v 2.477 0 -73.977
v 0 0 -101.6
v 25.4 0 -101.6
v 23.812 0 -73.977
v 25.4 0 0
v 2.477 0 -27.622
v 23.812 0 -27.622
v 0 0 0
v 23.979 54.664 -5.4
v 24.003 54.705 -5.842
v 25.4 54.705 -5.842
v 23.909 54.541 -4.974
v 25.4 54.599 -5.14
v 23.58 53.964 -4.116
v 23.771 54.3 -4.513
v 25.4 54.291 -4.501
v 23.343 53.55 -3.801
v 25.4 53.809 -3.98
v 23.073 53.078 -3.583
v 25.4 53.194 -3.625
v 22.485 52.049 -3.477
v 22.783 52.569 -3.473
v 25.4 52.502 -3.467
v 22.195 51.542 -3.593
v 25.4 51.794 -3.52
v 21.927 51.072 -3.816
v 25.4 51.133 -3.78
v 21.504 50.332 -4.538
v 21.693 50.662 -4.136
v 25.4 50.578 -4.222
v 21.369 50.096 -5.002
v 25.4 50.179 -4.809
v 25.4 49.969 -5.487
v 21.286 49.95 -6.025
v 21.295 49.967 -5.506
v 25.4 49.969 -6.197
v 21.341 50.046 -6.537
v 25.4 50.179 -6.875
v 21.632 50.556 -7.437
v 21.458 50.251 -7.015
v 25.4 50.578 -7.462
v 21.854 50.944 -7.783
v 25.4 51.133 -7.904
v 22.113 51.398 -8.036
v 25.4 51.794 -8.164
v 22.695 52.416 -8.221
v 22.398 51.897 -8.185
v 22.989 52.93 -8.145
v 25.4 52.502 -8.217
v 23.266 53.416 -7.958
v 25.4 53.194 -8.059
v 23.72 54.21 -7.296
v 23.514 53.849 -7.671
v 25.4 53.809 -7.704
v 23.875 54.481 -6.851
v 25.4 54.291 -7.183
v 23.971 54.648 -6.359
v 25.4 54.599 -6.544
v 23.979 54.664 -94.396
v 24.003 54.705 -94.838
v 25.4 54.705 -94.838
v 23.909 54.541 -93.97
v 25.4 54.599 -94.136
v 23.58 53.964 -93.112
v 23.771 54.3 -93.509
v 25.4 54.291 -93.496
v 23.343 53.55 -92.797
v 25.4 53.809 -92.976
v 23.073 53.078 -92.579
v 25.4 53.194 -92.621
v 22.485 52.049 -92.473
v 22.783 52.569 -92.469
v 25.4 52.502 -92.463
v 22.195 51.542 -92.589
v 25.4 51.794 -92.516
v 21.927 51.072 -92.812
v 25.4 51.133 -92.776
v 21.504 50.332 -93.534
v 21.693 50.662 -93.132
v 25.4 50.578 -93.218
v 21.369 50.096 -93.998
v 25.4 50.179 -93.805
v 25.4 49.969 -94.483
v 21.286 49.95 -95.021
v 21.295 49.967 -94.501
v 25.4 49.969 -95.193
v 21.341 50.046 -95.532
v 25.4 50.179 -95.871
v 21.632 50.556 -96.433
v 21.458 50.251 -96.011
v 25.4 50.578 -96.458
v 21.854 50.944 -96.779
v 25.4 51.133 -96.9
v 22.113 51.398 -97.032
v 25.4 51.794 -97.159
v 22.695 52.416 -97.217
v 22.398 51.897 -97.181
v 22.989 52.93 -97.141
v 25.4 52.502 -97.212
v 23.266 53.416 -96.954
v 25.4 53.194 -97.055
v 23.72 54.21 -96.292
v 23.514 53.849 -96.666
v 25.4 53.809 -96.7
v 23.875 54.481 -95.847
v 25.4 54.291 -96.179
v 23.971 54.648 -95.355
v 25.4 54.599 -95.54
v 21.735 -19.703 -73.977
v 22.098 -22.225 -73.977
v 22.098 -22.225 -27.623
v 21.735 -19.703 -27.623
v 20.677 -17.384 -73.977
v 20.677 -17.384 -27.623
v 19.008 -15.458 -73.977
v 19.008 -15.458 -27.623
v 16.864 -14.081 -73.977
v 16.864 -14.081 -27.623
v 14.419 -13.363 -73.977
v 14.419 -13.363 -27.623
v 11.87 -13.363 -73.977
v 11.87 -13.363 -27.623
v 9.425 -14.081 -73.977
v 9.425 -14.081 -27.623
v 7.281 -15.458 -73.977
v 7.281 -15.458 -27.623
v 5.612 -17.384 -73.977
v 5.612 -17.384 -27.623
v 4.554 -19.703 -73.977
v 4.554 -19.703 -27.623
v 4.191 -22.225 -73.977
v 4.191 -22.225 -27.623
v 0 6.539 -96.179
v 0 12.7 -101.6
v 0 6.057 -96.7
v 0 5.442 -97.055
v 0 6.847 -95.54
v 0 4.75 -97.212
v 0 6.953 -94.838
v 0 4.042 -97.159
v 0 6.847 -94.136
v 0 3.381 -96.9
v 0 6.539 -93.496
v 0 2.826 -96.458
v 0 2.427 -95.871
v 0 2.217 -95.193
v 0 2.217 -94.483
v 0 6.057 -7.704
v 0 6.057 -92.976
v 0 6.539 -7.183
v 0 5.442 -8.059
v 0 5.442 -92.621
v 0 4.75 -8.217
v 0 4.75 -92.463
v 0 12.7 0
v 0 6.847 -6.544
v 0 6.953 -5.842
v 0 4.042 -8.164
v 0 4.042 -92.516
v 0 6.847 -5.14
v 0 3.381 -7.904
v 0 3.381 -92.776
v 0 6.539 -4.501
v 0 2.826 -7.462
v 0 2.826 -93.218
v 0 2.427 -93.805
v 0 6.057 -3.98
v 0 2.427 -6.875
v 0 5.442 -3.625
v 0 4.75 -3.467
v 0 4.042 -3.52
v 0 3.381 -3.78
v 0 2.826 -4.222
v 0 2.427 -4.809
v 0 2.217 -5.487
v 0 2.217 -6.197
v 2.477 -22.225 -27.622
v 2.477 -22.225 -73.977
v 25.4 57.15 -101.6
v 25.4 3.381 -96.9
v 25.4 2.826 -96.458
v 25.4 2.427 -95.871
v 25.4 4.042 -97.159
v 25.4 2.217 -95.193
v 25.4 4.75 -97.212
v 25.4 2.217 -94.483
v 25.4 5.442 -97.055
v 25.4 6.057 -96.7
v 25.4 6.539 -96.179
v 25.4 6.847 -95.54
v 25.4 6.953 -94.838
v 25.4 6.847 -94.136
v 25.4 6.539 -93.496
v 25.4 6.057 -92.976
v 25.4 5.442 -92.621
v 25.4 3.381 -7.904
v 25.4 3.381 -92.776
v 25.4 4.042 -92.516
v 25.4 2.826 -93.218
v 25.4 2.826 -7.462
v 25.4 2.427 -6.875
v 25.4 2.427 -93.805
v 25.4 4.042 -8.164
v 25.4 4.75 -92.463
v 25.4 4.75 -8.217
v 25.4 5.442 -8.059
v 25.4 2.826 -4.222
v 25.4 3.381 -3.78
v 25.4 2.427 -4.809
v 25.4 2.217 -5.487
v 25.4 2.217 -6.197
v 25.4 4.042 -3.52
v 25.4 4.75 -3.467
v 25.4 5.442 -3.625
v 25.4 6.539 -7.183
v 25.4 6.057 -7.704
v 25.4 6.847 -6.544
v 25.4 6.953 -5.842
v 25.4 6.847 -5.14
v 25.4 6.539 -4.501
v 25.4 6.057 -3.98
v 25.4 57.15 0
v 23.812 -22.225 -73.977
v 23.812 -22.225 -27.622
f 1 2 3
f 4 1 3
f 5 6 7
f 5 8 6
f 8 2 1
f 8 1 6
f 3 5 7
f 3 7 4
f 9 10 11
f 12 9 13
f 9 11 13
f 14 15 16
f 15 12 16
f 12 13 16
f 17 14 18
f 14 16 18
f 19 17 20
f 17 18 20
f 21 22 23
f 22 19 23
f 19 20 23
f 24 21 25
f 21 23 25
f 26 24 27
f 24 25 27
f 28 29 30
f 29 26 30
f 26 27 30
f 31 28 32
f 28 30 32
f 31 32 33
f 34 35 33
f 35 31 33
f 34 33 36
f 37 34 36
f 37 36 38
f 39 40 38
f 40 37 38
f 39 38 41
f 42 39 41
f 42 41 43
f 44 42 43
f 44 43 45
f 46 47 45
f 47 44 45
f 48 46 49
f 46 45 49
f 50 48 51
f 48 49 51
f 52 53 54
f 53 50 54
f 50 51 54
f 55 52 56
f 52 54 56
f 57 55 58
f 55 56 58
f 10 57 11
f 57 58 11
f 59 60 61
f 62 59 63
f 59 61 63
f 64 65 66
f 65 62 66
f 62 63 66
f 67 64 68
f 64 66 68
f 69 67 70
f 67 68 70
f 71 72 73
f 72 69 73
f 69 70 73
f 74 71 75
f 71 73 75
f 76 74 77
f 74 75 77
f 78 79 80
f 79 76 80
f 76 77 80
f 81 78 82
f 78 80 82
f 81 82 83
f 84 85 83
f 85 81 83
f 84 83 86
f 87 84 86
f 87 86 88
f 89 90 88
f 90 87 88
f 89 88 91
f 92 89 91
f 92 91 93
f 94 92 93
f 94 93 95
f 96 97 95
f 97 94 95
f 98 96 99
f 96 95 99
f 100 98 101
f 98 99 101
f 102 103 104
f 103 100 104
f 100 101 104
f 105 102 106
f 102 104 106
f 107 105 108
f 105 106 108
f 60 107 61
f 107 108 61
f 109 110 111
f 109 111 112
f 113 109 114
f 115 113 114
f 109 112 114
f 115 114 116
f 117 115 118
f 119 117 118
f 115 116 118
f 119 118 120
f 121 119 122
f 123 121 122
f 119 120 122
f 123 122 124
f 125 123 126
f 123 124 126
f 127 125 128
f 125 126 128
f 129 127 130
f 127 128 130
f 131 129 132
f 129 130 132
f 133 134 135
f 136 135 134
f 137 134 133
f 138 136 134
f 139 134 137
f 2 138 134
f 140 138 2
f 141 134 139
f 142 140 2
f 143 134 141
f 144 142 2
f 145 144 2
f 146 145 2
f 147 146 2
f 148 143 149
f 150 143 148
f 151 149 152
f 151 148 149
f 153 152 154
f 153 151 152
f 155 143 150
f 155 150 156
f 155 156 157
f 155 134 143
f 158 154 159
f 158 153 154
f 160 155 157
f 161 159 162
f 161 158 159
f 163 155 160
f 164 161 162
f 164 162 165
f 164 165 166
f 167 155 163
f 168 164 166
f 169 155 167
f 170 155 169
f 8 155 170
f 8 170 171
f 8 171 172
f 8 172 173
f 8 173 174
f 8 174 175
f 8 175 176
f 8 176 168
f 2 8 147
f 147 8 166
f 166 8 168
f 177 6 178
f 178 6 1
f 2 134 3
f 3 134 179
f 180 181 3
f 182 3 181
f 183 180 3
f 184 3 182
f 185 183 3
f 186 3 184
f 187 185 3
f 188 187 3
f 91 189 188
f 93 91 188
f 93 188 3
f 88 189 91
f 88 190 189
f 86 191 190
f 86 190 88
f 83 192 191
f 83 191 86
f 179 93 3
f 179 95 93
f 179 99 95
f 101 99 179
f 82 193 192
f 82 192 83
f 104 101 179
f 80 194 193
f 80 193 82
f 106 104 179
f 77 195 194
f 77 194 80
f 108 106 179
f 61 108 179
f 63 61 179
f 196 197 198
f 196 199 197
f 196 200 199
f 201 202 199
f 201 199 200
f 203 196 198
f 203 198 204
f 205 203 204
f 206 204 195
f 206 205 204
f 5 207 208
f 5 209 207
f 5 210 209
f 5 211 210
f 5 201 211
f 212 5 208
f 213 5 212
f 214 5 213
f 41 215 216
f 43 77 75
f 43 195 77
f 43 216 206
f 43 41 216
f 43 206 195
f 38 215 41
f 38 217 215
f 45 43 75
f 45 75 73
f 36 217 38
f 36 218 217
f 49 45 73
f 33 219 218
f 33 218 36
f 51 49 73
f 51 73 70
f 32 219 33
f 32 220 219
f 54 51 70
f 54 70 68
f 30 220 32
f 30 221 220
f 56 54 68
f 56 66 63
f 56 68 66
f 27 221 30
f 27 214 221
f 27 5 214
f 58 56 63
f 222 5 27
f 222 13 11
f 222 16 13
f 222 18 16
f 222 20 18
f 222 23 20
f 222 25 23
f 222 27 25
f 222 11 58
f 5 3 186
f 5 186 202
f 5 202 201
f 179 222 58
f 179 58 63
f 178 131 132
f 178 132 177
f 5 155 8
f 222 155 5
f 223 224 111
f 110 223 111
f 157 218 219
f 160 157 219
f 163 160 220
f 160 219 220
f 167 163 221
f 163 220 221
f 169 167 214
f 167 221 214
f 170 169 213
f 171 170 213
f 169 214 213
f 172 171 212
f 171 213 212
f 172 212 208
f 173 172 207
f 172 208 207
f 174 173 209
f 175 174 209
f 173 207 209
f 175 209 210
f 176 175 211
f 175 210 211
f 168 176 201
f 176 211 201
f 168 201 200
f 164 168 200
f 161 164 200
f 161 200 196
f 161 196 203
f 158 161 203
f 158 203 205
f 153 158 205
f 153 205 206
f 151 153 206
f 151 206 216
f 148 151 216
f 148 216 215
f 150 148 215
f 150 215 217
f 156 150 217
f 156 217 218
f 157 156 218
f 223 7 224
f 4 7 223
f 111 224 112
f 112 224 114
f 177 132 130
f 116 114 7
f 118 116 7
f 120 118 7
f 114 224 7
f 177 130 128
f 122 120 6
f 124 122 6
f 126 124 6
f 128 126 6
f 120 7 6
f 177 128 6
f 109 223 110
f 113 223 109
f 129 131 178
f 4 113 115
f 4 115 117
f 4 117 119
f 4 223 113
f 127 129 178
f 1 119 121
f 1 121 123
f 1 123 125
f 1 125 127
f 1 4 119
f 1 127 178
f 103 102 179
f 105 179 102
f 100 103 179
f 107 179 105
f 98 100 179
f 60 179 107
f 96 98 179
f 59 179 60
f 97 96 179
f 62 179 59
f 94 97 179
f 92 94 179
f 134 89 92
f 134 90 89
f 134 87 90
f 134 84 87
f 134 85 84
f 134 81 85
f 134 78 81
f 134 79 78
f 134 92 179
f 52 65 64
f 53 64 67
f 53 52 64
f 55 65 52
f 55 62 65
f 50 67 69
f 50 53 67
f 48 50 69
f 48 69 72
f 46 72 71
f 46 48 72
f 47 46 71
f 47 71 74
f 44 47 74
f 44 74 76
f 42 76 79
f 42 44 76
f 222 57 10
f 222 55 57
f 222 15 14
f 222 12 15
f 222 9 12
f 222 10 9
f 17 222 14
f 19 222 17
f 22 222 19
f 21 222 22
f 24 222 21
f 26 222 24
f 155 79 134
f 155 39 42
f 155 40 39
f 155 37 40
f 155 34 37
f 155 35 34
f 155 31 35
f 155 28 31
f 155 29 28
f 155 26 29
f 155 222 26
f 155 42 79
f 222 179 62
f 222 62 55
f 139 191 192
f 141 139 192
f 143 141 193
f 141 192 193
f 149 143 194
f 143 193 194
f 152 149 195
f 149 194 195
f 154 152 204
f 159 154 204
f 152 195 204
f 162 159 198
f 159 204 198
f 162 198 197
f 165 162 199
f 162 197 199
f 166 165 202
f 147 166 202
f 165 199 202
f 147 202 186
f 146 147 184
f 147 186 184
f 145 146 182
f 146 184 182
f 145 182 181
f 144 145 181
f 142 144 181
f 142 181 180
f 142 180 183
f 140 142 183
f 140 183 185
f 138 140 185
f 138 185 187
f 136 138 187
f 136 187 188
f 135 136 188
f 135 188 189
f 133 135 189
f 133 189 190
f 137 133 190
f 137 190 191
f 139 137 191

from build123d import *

# Parameters (mm, degrees)
BOSS_EXTRUDE1_DEPTH     = 101.6
SKETCH4_W               = 21.336
SKETCH4_H               = 46.355
BOSS_EXTRUDE2_DEPTH     = 22.225
CUT_EXTRUDE5_DEPTH      = 97.870805748
CUT_EXTRUDE5_DEPTH_BACK = 97.870805748
SKETCH8_R               = 2.38125
CUT_EXTRUDE6_DEPTH      = 120.305668348


with BuildPart() as part:
    # Sketch1 → Boss-Extrude1 (new body)
    with BuildSketch(Plane.XY):
        Polygon((0, 0), (25.4, 0), (25.4, 57.15), (0, 12.7), align=None)
    extrude(amount=-BOSS_EXTRUDE1_DEPTH)

    # Sketch4 → Boss-Extrude2 (add)
    with BuildSketch(Plane(origin=(21.809590146, 0, -29.461184826), x_dir=(-1, 0, 0), z_dir=(0, -1, 0))):
        with Locations((8.665090146, 21.338815174)):
            Rectangle(SKETCH4_W, SKETCH4_H)
    extrude(amount=BOSS_EXTRUDE2_DEPTH)

    # Sketch7 → Cut-Extrude5 (cut, two sides: drawn at the far end of the back side and taken through both)
    with BuildSketch(Plane(origin=(0, 0, -73.9775), x_dir=(-1, 0, 0), z_dir=(0, 0, -1)).offset(-CUT_EXTRUDE5_DEPTH_BACK)):
        with BuildLine():
            Line((-22.098, -197.012283842), (-22.098, -22.225))
            ThreePointArc((-22.098, -22.225), (-13.1445, -13.2715), (-4.191, -22.225))
            Line((-4.191, -22.225), (-4.191, -197.012283842))
            Line((-4.191, -197.012283842), (-4.191, -546.586851526))
            Line((-4.191, -546.586851526), (-22.098, -546.586851526))
            Line((-22.098, -546.586851526), (-22.098, -197.012283842))
        make_face()
    extrude(amount=CUT_EXTRUDE5_DEPTH + CUT_EXTRUDE5_DEPTH_BACK, mode=Mode.SUBTRACT)

    # Sketch8 → Cut-Extrude6 (cut, through all)
    with BuildSketch(Plane(origin=(25.4, 0, 0), x_dir=(0, 0, -1), z_dir=(1, 0, 0))):
        with Locations(Location((5.842, 52.324, 0), (0, 0, 90))):
            Circle(SKETCH8_R)
        with Locations(Location((5.842, 4.572, 0), (0, 0, 90))):
            Circle(SKETCH8_R)
        with Locations(Location((94.837878374, 4.572, 0), (0, 0, 90))):
            Circle(SKETCH8_R)
        with Locations(Location((94.837878374, 52.324, 0), (0, 0, 90))):
            Circle(SKETCH8_R)
    extrude(amount=-CUT_EXTRUDE6_DEPTH, mode=Mode.SUBTRACT)


solid = part.part
